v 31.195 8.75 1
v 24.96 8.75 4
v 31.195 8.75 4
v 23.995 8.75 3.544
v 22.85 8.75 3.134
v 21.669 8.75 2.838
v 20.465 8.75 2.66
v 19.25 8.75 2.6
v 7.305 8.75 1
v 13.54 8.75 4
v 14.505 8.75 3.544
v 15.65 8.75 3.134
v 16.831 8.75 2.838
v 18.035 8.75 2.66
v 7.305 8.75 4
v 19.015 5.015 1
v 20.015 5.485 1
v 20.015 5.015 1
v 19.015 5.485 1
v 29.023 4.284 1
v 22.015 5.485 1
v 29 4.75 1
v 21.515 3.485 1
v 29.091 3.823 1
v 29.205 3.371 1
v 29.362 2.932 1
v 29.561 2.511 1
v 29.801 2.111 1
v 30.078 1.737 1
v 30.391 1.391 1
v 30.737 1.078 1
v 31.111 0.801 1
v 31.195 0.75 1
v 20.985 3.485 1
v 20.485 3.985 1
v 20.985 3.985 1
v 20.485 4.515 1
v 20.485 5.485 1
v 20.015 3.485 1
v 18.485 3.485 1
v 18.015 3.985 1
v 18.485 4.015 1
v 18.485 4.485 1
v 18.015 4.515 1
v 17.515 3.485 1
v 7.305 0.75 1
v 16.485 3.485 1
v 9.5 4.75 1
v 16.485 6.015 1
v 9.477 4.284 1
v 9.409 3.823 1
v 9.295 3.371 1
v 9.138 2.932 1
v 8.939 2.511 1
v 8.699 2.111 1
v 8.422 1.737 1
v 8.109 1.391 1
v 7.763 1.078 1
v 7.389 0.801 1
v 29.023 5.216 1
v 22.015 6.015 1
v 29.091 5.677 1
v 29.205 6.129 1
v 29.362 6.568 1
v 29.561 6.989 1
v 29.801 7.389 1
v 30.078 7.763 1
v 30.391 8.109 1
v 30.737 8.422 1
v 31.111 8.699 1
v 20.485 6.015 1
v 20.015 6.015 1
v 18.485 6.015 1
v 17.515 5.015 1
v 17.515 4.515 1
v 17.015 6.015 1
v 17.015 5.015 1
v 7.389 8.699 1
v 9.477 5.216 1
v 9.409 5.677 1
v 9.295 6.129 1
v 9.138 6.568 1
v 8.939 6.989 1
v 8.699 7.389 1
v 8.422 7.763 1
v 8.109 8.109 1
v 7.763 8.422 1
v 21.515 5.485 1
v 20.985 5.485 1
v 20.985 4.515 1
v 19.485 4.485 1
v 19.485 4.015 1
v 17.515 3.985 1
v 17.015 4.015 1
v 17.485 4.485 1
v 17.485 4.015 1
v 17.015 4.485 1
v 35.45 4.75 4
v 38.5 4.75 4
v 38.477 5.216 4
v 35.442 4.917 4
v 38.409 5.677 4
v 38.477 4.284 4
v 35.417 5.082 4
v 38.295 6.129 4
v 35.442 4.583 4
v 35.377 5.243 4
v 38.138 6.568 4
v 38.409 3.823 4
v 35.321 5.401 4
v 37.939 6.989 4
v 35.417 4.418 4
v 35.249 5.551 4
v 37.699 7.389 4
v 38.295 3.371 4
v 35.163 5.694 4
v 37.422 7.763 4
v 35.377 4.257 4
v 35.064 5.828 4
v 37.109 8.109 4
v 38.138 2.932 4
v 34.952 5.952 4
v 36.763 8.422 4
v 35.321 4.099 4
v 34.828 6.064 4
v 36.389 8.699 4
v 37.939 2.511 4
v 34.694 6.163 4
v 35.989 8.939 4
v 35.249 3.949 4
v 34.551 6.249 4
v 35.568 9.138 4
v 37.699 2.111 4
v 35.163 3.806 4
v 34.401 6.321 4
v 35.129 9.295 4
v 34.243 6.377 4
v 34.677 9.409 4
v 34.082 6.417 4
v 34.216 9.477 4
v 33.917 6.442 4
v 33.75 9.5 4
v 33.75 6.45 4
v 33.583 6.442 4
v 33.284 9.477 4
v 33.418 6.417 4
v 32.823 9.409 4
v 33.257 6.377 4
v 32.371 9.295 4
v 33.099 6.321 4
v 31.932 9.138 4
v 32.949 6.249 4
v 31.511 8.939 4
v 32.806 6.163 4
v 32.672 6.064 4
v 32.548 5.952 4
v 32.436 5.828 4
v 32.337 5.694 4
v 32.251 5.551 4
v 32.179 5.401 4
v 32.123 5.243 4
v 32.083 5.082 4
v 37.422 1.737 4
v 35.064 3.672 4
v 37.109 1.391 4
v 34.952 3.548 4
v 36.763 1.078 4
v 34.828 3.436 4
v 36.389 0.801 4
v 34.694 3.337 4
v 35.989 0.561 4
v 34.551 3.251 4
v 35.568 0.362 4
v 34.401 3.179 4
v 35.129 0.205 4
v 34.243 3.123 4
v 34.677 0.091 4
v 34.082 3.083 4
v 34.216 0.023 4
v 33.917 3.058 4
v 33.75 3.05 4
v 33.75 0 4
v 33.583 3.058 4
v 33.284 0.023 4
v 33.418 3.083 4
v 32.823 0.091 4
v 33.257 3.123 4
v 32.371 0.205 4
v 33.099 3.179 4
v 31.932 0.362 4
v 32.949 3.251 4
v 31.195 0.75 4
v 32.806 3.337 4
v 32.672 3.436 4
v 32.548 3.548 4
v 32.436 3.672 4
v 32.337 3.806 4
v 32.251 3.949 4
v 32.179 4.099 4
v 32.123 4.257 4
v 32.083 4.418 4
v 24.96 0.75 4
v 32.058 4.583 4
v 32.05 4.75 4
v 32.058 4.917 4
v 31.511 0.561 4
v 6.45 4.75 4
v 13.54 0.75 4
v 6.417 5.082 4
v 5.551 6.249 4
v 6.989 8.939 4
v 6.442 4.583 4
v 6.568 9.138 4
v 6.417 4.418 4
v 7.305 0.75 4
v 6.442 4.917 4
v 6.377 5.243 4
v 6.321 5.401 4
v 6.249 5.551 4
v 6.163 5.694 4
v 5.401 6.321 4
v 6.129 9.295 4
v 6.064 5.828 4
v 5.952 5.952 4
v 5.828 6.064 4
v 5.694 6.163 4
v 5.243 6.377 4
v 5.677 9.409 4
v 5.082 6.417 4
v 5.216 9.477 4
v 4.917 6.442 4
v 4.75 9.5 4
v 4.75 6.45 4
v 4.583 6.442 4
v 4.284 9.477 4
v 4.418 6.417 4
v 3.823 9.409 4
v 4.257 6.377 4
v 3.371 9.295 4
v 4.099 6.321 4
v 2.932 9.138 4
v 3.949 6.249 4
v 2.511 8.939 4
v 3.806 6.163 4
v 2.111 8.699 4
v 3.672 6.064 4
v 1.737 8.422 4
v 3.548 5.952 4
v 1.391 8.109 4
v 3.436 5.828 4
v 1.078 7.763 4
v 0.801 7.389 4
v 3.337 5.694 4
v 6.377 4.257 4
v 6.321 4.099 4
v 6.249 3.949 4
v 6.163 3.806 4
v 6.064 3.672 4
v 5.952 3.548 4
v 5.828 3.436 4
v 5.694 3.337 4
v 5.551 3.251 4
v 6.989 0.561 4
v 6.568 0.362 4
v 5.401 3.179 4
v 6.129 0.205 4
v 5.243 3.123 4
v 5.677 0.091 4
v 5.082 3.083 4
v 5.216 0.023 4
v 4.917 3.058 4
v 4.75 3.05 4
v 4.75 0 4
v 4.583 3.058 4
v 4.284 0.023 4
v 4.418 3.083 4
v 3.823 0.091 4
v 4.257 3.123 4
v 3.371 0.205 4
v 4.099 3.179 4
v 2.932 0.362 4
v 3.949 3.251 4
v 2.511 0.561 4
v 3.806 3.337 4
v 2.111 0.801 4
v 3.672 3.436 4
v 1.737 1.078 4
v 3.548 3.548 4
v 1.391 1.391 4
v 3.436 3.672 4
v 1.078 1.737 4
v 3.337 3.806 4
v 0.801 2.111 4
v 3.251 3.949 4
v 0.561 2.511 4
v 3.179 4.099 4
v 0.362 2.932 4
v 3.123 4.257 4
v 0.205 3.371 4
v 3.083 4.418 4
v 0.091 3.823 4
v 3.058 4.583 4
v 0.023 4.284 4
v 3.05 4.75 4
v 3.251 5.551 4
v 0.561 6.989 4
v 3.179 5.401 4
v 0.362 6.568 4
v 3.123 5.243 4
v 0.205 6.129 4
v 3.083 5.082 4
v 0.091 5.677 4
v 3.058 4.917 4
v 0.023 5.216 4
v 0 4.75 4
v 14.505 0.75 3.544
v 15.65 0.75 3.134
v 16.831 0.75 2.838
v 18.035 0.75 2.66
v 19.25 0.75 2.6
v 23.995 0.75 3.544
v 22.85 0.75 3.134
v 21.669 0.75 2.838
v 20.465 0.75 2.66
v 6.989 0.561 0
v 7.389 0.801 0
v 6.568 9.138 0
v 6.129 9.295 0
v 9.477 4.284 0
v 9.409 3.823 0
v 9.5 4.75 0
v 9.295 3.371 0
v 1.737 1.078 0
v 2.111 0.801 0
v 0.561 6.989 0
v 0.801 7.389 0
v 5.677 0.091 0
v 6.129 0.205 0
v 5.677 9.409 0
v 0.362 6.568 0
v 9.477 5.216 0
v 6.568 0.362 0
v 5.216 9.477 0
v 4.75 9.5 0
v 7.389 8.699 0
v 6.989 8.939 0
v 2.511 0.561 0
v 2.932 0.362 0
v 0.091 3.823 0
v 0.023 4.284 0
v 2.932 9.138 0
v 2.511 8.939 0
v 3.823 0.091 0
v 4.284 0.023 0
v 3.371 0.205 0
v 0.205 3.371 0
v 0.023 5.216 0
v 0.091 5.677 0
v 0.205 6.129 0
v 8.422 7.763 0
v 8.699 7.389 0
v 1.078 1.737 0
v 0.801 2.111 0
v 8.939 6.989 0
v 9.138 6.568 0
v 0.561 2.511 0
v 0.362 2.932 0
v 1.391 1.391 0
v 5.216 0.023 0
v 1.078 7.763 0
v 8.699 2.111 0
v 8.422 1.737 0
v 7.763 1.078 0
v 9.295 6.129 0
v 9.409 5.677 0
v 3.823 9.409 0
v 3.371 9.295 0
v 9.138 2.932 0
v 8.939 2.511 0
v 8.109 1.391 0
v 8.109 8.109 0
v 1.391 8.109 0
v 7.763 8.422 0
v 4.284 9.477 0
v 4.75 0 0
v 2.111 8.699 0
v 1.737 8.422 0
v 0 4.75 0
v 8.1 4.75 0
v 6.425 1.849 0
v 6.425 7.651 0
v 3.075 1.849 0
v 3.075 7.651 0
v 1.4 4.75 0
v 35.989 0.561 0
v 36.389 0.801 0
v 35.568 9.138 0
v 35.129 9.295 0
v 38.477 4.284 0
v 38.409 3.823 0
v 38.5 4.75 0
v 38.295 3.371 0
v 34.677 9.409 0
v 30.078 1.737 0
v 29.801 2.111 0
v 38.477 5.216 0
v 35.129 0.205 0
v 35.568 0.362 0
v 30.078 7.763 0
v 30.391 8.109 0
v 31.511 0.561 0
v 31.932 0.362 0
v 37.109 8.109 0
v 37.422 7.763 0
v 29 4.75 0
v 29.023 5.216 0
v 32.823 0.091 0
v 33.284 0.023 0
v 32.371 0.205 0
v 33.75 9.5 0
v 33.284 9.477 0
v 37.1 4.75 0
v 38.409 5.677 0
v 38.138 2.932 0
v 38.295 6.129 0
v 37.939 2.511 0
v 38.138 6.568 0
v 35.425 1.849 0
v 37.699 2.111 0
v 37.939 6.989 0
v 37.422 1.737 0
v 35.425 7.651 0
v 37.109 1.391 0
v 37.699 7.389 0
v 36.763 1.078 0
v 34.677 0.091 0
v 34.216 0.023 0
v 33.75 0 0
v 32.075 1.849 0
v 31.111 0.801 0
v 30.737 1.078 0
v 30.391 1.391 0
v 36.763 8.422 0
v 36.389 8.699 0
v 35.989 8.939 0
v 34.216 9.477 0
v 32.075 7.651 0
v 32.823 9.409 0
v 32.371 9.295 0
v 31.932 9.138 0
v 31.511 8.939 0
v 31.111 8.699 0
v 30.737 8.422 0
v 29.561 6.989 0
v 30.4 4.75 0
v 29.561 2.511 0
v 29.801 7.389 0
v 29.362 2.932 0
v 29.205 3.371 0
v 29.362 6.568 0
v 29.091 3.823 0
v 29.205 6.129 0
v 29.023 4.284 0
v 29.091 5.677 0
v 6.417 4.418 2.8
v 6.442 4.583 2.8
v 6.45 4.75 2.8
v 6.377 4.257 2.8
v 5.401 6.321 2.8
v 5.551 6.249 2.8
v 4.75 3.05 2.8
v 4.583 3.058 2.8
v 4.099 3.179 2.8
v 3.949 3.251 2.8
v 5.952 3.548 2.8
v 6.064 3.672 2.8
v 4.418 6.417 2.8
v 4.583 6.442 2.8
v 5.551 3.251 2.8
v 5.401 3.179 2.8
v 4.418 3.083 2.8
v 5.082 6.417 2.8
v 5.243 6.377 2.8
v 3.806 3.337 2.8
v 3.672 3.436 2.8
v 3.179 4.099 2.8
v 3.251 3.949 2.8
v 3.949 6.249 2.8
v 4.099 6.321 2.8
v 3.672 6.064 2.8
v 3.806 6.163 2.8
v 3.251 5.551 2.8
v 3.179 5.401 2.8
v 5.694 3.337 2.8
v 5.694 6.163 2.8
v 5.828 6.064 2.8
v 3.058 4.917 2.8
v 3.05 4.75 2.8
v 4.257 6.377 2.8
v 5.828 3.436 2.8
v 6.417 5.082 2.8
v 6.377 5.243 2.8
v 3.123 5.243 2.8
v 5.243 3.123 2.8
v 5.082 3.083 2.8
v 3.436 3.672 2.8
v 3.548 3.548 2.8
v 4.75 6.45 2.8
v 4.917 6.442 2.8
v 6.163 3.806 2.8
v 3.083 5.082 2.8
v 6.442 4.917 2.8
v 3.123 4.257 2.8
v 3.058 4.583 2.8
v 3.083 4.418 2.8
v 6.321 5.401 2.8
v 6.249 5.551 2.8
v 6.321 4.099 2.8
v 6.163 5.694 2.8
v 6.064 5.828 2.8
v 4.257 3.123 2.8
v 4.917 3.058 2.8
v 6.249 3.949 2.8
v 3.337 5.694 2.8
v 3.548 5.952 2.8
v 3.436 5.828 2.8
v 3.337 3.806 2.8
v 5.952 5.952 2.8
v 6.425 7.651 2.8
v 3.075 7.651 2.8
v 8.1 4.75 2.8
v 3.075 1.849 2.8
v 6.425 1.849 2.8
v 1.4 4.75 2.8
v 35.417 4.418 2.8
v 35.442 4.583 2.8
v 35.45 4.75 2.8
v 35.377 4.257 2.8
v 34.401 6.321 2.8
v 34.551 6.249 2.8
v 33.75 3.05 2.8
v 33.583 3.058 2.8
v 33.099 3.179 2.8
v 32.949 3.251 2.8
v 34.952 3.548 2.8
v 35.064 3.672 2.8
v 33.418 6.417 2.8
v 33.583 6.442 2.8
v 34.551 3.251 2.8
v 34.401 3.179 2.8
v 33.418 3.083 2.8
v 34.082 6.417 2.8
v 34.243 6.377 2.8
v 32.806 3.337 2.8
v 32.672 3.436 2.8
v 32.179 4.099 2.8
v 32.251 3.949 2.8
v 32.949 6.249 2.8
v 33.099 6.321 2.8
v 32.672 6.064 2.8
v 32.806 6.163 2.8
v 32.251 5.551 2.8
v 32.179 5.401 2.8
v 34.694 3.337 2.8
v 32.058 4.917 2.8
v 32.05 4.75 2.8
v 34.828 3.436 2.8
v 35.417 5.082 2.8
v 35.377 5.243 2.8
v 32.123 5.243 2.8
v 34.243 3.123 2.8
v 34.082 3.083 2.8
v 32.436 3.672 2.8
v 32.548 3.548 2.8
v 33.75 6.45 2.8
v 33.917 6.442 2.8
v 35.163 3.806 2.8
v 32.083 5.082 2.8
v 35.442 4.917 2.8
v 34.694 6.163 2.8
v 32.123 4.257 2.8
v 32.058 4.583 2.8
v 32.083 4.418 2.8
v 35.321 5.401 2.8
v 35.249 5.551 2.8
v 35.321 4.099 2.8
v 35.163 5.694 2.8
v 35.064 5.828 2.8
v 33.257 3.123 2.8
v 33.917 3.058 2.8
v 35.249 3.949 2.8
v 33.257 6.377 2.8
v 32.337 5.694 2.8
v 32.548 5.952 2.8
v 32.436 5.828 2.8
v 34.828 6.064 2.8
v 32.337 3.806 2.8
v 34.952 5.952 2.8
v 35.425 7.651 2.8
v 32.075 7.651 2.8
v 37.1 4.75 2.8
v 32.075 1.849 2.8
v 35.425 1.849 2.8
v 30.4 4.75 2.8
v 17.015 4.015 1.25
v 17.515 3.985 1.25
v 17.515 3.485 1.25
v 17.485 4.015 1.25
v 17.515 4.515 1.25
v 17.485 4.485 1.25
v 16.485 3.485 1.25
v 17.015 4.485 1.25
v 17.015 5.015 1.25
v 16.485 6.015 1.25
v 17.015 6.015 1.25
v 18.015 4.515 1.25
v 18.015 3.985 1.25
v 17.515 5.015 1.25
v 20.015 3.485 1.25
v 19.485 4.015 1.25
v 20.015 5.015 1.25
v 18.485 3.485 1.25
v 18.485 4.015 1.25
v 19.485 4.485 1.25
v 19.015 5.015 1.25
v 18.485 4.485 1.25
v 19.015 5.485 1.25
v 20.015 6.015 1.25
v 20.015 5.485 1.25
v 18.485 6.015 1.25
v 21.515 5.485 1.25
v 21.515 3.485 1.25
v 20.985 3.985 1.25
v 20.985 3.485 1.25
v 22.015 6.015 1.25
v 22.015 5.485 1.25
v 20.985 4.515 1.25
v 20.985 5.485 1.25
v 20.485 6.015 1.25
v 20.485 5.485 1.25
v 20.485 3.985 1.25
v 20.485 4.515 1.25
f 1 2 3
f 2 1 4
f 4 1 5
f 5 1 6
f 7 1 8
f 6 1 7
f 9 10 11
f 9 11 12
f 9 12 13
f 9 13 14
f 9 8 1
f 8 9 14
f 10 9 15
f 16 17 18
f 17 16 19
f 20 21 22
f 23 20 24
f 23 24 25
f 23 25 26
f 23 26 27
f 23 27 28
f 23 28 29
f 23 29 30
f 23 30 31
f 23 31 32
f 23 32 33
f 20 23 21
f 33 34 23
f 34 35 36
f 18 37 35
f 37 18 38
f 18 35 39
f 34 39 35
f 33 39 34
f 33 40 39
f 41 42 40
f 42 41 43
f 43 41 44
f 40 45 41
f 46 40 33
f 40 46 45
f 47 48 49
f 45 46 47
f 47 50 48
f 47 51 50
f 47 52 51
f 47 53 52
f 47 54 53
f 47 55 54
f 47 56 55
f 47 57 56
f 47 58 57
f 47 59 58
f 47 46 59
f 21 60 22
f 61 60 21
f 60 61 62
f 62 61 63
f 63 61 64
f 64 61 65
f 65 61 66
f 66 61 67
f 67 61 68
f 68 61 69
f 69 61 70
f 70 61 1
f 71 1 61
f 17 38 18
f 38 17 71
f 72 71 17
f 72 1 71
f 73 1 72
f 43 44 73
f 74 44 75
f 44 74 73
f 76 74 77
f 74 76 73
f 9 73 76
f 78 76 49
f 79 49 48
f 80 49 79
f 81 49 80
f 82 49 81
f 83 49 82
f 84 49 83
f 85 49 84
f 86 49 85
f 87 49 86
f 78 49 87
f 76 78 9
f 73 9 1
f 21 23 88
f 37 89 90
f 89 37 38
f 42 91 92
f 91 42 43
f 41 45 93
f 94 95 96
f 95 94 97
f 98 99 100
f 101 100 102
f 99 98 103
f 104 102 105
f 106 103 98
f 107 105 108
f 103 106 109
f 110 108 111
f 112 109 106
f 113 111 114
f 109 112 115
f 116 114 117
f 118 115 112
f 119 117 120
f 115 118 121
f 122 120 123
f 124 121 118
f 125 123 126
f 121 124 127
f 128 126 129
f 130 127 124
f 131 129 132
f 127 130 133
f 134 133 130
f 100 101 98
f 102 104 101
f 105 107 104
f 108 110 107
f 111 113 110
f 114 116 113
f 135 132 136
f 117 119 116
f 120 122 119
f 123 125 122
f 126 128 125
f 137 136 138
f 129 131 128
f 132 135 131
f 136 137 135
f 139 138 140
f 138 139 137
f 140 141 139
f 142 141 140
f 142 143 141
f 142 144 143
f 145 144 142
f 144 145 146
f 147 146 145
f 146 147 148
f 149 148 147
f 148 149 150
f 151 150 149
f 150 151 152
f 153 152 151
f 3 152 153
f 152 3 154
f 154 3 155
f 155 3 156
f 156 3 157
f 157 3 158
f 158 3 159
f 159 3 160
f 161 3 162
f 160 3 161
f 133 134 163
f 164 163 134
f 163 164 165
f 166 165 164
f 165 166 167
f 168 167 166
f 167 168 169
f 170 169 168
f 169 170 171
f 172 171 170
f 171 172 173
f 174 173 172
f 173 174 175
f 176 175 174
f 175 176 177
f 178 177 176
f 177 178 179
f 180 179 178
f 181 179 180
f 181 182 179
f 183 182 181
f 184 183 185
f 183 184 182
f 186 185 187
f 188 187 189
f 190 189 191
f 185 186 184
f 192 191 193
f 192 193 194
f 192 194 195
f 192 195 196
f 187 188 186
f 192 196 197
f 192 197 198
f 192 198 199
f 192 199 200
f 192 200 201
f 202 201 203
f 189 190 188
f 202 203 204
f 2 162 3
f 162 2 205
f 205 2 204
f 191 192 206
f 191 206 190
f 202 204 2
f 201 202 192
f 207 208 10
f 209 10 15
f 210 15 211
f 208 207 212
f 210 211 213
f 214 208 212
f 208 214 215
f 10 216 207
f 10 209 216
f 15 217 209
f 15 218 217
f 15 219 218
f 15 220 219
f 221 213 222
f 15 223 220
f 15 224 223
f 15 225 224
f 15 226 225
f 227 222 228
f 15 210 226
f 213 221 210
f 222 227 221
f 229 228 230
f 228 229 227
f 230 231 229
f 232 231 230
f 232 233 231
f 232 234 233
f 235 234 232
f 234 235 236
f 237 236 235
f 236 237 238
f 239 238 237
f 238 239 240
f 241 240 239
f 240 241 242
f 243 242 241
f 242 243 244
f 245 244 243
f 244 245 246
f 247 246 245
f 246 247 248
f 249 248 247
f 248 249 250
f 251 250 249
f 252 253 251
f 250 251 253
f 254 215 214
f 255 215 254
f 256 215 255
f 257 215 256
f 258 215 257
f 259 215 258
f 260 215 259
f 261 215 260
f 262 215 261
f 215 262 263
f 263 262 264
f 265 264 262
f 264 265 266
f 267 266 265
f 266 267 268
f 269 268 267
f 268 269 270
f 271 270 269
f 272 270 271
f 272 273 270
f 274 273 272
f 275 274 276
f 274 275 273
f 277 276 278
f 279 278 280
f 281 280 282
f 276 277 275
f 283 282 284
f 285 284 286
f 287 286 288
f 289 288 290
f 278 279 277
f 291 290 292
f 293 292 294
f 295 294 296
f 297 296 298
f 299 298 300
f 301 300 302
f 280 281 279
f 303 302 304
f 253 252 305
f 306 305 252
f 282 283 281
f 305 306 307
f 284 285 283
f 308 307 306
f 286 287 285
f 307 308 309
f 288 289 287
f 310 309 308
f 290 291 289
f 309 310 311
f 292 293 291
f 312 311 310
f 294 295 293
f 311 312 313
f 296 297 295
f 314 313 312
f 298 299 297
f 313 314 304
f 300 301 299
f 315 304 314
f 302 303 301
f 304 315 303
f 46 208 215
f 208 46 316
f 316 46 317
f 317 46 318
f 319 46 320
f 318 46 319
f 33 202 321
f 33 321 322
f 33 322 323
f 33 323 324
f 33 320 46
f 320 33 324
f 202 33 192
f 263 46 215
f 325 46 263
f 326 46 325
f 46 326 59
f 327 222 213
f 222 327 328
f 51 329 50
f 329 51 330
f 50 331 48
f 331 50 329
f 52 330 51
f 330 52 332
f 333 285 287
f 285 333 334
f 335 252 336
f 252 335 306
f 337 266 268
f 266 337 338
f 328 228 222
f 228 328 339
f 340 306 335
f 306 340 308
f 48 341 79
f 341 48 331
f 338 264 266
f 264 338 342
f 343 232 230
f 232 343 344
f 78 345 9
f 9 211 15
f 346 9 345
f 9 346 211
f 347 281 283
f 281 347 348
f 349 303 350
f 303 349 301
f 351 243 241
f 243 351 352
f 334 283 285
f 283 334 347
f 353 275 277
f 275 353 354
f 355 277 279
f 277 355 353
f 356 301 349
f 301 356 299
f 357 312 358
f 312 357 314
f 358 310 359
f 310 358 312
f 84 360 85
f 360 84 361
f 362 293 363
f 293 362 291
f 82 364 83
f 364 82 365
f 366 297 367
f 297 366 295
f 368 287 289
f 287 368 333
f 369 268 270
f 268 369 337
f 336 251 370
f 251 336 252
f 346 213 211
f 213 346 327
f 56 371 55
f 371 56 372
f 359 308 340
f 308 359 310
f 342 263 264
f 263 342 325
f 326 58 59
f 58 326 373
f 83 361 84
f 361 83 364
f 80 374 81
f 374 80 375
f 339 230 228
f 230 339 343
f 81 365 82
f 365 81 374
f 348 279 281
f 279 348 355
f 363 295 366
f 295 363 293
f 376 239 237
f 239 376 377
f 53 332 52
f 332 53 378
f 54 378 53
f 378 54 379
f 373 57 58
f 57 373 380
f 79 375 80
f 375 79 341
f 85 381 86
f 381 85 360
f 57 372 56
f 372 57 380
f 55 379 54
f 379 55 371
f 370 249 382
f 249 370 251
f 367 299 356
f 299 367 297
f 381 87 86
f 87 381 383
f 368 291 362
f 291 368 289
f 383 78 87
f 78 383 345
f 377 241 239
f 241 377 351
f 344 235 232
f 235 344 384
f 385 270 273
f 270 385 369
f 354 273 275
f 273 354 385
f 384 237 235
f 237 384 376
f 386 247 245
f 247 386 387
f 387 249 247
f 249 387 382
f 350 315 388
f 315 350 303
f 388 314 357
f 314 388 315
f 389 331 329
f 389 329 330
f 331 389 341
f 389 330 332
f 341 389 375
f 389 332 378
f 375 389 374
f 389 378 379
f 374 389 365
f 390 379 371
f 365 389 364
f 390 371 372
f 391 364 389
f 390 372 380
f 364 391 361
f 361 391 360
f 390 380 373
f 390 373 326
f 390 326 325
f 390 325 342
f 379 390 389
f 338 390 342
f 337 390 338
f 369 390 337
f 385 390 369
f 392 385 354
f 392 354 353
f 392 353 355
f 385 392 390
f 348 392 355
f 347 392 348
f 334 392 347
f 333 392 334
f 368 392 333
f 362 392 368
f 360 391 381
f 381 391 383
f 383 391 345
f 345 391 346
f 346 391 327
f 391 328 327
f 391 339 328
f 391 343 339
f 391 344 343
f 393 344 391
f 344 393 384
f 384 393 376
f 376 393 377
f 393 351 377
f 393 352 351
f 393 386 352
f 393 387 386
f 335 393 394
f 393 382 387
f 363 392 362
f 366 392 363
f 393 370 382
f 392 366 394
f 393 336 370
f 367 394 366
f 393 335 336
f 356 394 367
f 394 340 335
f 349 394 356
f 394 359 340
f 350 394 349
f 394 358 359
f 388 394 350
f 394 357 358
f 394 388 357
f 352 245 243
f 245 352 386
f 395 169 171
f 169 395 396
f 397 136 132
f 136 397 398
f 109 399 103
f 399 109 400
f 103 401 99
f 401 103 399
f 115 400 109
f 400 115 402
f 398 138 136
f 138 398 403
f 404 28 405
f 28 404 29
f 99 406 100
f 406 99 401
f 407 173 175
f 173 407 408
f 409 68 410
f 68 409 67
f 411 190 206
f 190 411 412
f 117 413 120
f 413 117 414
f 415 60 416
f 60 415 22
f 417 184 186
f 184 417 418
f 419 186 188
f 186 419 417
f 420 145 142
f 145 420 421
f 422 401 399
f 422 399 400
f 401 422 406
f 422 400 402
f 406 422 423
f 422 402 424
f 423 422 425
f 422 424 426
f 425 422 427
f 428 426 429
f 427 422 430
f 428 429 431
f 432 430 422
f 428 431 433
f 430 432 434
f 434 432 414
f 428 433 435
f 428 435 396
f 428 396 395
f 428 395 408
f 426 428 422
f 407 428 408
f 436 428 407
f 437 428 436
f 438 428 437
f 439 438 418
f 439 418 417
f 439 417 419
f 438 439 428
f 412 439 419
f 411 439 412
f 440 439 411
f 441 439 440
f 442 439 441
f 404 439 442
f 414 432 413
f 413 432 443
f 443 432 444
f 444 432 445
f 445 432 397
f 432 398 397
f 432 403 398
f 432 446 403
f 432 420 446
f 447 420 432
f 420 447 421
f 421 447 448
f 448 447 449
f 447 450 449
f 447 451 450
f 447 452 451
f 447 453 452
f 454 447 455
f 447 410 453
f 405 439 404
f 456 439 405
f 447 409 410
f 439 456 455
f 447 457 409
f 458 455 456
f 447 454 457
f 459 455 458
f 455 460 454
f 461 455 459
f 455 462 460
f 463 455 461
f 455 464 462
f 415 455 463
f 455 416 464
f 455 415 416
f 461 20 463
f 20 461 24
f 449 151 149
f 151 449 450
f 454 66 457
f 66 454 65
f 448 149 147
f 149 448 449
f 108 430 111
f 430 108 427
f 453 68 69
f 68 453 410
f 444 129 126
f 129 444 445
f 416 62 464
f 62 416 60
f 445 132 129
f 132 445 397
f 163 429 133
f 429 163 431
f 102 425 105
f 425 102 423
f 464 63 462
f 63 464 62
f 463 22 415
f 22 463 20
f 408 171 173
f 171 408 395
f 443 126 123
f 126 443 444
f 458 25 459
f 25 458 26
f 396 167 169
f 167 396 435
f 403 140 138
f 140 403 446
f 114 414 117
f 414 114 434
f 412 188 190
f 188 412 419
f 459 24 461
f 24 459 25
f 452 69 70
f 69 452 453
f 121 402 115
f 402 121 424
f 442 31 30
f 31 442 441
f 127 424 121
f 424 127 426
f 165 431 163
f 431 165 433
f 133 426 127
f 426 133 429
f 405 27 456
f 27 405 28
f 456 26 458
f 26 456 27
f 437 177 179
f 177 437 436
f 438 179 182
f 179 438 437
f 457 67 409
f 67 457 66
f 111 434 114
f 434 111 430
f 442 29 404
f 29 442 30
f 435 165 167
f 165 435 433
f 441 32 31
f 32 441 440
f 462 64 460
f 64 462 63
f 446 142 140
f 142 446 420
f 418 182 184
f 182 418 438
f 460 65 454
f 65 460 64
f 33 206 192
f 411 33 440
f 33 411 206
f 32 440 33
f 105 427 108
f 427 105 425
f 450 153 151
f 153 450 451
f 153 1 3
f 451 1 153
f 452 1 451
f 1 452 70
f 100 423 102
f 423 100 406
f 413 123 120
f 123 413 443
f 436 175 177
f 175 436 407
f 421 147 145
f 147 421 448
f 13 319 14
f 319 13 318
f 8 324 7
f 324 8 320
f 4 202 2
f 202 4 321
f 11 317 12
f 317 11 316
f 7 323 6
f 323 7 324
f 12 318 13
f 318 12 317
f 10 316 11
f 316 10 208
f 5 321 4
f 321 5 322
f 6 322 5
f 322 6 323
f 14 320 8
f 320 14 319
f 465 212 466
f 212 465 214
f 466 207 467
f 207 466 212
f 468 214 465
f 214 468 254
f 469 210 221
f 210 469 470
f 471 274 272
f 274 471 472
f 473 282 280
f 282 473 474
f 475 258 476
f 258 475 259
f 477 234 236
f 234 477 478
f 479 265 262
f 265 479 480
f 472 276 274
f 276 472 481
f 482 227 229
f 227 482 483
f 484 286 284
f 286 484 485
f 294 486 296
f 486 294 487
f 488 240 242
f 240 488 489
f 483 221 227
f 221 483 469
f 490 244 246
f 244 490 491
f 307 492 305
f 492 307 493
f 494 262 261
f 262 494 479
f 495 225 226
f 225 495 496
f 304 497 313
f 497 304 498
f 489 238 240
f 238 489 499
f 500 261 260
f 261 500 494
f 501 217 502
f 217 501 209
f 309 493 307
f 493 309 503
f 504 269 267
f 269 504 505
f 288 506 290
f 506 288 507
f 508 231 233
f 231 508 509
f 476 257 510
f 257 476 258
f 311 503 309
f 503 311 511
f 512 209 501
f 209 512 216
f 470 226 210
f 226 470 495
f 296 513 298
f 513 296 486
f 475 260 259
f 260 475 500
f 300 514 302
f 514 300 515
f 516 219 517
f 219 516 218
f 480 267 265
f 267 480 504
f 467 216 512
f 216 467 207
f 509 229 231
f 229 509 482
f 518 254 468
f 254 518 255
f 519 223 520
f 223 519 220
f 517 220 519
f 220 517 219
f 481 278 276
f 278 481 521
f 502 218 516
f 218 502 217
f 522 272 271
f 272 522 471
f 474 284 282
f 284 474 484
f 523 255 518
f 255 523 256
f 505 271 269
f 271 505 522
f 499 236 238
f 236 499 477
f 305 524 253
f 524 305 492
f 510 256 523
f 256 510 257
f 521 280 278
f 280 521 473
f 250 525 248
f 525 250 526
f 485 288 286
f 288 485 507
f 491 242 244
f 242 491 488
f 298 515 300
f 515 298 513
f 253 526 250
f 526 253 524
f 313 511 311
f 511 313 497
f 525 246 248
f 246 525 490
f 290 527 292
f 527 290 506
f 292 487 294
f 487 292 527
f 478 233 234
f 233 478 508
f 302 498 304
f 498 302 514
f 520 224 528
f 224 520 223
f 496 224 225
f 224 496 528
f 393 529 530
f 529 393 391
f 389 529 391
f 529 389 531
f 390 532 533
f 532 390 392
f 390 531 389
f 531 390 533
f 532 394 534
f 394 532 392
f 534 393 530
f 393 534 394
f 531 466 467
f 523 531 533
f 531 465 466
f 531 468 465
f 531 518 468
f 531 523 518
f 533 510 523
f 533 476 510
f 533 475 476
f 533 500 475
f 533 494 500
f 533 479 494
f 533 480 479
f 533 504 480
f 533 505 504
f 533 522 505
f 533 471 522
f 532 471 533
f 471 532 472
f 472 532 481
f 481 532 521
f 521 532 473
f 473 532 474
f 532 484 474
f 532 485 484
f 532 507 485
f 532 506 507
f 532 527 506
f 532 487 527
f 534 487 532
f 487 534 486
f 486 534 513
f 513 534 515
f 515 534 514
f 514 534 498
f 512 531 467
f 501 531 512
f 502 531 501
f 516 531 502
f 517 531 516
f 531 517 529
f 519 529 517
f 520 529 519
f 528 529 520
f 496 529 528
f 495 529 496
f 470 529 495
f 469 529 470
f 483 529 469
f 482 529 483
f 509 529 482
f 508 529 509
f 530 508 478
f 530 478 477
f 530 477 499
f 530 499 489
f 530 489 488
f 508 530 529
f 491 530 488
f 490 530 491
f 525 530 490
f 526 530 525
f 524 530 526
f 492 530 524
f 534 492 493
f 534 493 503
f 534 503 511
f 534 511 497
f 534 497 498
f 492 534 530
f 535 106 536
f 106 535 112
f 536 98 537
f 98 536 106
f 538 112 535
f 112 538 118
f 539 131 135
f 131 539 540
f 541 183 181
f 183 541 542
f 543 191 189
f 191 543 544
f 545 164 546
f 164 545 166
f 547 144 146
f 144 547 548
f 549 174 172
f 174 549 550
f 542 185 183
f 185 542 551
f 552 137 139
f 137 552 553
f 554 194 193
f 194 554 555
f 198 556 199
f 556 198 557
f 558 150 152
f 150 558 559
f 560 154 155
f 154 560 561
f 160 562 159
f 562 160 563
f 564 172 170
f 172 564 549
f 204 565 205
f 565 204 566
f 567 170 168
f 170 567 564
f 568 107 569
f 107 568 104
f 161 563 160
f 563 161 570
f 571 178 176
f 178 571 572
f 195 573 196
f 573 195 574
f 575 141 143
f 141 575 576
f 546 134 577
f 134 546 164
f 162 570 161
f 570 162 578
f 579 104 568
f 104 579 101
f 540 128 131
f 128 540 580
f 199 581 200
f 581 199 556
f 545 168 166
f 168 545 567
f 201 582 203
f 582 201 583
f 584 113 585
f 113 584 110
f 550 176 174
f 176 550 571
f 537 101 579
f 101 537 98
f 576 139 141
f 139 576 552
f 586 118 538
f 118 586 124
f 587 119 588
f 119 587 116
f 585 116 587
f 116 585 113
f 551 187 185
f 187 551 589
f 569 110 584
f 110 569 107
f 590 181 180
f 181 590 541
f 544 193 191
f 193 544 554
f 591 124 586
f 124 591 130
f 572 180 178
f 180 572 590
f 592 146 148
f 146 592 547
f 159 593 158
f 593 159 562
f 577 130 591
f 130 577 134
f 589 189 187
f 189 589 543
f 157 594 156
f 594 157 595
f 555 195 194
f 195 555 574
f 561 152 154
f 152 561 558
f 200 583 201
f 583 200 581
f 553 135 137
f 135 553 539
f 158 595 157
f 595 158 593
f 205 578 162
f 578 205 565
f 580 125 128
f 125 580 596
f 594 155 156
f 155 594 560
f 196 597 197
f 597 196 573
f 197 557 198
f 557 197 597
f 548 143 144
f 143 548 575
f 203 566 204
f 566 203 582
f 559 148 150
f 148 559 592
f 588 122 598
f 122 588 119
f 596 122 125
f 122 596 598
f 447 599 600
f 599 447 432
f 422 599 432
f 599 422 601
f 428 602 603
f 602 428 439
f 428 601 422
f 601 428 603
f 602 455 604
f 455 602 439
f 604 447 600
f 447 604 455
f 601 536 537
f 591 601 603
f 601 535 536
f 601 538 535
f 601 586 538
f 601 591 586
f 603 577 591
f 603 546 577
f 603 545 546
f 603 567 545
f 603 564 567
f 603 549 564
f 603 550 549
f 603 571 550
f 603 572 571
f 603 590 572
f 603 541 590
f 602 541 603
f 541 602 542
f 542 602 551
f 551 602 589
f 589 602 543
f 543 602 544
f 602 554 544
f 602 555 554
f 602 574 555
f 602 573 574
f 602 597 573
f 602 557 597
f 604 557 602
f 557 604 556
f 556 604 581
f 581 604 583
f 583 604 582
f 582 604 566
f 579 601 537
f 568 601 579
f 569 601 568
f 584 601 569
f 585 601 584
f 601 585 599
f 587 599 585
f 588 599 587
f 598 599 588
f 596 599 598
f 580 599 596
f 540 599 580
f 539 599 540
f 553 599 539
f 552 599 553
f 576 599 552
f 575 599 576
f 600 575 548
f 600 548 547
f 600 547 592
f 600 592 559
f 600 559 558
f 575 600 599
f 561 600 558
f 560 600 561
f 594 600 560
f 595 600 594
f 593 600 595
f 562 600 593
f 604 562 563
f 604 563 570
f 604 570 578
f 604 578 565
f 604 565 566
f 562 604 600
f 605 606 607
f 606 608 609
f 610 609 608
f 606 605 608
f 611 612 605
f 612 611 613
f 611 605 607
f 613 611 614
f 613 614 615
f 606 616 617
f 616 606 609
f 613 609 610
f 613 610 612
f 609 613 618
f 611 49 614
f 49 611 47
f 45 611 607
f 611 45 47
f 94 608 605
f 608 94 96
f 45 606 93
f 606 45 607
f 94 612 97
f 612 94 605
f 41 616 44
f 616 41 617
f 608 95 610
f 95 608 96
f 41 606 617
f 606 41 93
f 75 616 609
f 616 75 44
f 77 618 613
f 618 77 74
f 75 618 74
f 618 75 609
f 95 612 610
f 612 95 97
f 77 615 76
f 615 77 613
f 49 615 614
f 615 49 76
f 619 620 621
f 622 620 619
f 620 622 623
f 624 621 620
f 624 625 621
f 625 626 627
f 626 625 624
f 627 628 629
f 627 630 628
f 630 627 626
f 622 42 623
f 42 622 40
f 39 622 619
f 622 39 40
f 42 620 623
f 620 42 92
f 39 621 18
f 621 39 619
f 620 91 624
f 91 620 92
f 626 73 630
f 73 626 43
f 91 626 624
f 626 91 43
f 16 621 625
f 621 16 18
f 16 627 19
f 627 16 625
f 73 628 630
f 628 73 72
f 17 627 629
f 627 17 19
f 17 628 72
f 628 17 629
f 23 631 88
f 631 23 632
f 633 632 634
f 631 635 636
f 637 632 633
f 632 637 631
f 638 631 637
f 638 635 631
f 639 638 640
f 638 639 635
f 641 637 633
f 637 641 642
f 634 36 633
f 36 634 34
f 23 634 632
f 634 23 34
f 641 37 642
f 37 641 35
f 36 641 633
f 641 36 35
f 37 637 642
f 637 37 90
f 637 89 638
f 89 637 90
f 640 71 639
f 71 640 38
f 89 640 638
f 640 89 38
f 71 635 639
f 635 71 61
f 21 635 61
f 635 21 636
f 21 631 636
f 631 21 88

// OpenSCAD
// RF300上夾板・反向長螺絲
$fn=64;
translate([-41.75,-69.55,69.2]){rotate([180,0,0]){difference(){translate([0,-14.3,0]){difference(){difference(){difference(){difference(){difference(){union(){union(){translate([61,-60,0]){translate([0,0,65.2]){linear_extrude(height=3)polygon([[17.5,1],[17.44236,1.58527],[17.27164,2.14805],[16.99441,2.66671],[16.62132,3.12132],[16.16671,3.49441],[15.64805,3.77164],[15.08527,3.94236],[14.5,4],[-14.5,4],[-15.08527,3.94236],[-15.64805,3.77164],[-16.16671,3.49441],[-16.62132,3.12132],[-16.99441,2.66671],[-17.27164,2.14805],[-17.44236,1.58527],[-17.5,1],[-17.5,-1],[-17.44236,-1.58527],[-17.27164,-2.14805],[-16.99441,-2.66671],[-16.62132,-3.12132],[-16.16671,-3.49441],[-15.64805,-3.77164],[-15.08527,-3.94236],[-14.5,-4],[14.5,-4],[15.08527,-3.94236],[15.64805,-3.77164],[16.16671,-3.49441],[16.62132,-3.12132],[16.99441,-2.66671],[17.27164,-2.14805],[17.44236,-1.58527],[17.5,-1]]);}}translate([46.5,-60,65.2]){cylinder(h=4,d1=9.5,d2=9.5,$fn=64);}}translate([75.5,-60,65.2]){cylinder(h=4,d1=9.5,d2=9.5,$fn=64);}}translate([61,-66,54.2]){rotate([-90,0,0]){translate([0,0,0]){cylinder(h=12,d1=24.8,d2=24.8,$fn=64);}}}}translate([46.5,-60,64]){cylinder(h=10,d1=3.4,d2=3.4,$fn=64);}}translate([46.5,-60,66.4]){cylinder(h=4.1,d1=6.7,d2=6.7,$fn=6);}}translate([75.5,-60,64]){cylinder(h=10,d1=3.4,d2=3.4,$fn=64);}}translate([75.5,-60,66.4]){cylinder(h=4.1,d1=6.7,d2=6.7,$fn=6);}}}difference(){translate([0,-14.3,0]){difference(){difference(){difference(){difference(){difference(){translate([61,-60,0]){translate([0,0,65.2]){linear_extrude(height=3)polygon([[17.5,1],[17.44236,1.58527],[17.27164,2.14805],[16.99441,2.66671],[16.62132,3.12132],[16.16671,3.49441],[15.64805,3.77164],[15.08527,3.94236],[14.5,4],[-14.5,4],[-15.08527,3.94236],[-15.64805,3.77164],[-16.16671,3.49441],[-16.62132,3.12132],[-16.99441,2.66671],[-17.27164,2.14805],[-17.44236,1.58527],[-17.5,1],[-17.5,-1],[-17.44236,-1.58527],[-17.27164,-2.14805],[-16.99441,-2.66671],[-16.62132,-3.12132],[-16.16671,-3.49441],[-15.64805,-3.77164],[-15.08527,-3.94236],[-14.5,-4],[14.5,-4],[15.08527,-3.94236],[15.64805,-3.77164],[16.16671,-3.49441],[16.62132,-3.12132],[16.99441,-2.66671],[17.27164,-2.14805],[17.44236,-1.58527],[17.5,-1]]);}}translate([61,-66,54.2]){rotate([-90,0,0]){translate([0,0,0]){cylinder(h=12,d1=24.8,d2=24.8,$fn=64);}}}}translate([46.5,-60,64]){cylinder(h=7,d1=3.4,d2=3.4,$fn=64);}}translate([46.5,-60,68.3]){rotate([180,0,0]){translate([0,0,0]){cylinder(h=1.7,d1=6.4,d2=3.4,$fn=64);}}}}translate([75.5,-60,64]){cylinder(h=7,d1=3.4,d2=3.4,$fn=64);}}translate([75.5,-60,68.3]){rotate([180,0,0]){translate([0,0,0]){cylinder(h=1.7,d1=6.4,d2=3.4,$fn=64);}}}}}difference(){translate([0,-14.3,0]){difference(){difference(){difference(){difference(){difference(){translate([61,-60,0]){translate([0,0,65.2]){linear_extrude(height=3)polygon([[17.5,1],[17.44236,1.58527],[17.27164,2.14805],[16.99441,2.66671],[16.62132,3.12132],[16.16671,3.49441],[15.64805,3.77164],[15.08527,3.94236],[14.5,4],[-14.5,4],[-15.08527,3.94236],[-15.64805,3.77164],[-16.16671,3.49441],[-16.62132,3.12132],[-16.99441,2.66671],[-17.27164,2.14805],[-17.44236,1.58527],[-17.5,1],[-17.5,-1],[-17.44236,-1.58527],[-17.27164,-2.14805],[-16.99441,-2.66671],[-16.62132,-3.12132],[-16.16671,-3.49441],[-15.64805,-3.77164],[-15.08527,-3.94236],[-14.5,-4],[14.5,-4],[15.08527,-3.94236],[15.64805,-3.77164],[16.16671,-3.49441],[16.62132,-3.12132],[16.99441,-2.66671],[17.27164,-2.14805],[17.44236,-1.58527],[17.5,-1]]);}}translate([61,-66,54.2]){rotate([-90,0,0]){translate([0,0,0]){cylinder(h=12,d1=24.8,d2=24.8,$fn=64);}}}}translate([46.5,-60,64]){cylinder(h=7,d1=3.4,d2=3.4,$fn=64);}}translate([46.5,-60,68.3]){rotate([180,0,0]){translate([0,0,0]){cylinder(h=1.7,d1=6.4,d2=3.4,$fn=64);}}}}translate([75.5,-60,64]){cylinder(h=7,d1=3.4,d2=3.4,$fn=64);}}translate([75.5,-60,68.3]){rotate([180,0,0]){translate([0,0,0]){cylinder(h=1.7,d1=6.4,d2=3.4,$fn=64);}}}}}multmatrix([[1,0,0,61],[0,1,0,-74.3],[0,0,1,68.2],[0,0,0,1]]){union(){union(){union(){union(){union(){union(){union(){union(){union(){union(){union(){union(){union(){union(){union(){union(){union(){union(){union(){union(){union(){union(){union(){union(){union(){union(){translate([-2.765,0.735,-0.25]){cube([0.53,0.53,0.37]);}translate([-2.265,0.735,-0.25]){cube([0.53,0.53,0.37]);}}translate([-2.765,0.235,-0.25]){cube([0.53,0.53,0.37]);}}translate([-1.765,0.235,-0.25]){cube([0.53,0.53,0.37]);}}translate([-2.765,-0.265,-0.25]){cube([0.53,0.53,0.37]);}}translate([-2.265,-0.265,-0.25]){cube([0.53,0.53,0.37]);}}translate([-2.765,-0.765,-0.25]){cube([0.53,0.53,0.37]);}}translate([-2.765,-1.265,-0.25]){cube([0.53,0.53,0.37]);}}translate([-0.765,0.735,-0.25]){cube([0.53,0.53,0.37]);}}translate([-0.265,0.735,-0.25]){cube([0.53,0.53,0.37]);}}translate([0.235,0.735,-0.25]){cube([0.53,0.53,0.37]);}}translate([0.235,0.235,-0.25]){cube([0.53,0.53,0.37]);}}translate([-0.765,-0.265,-0.25]){cube([0.53,0.53,0.37]);}}translate([-0.265,-0.265,-0.25]){cube([0.53,0.53,0.37]);}}translate([0.235,-0.265,-0.25]){cube([0.53,0.53,0.37]);}}translate([-0.765,-0.765,-0.25]){cube([0.53,0.53,0.37]);}}translate([-0.765,-1.265,-0.25]){cube([0.53,0.53,0.37]);}}translate([-0.265,-1.265,-0.25]){cube([0.53,0.53,0.37]);}}translate([0.235,-1.265,-0.25]){cube([0.53,0.53,0.37]);}}translate([1.735,0.735,-0.25]){cube([0.53,0.53,0.37]);}}translate([1.235,0.235,-0.25]){cube([0.53,0.53,0.37]);}}translate([1.735,0.235,-0.25]){cube([0.53,0.53,0.37]);}}translate([1.735,-0.265,-0.25]){cube([0.53,0.53,0.37]);}}translate([1.735,-0.765,-0.25]){cube([0.53,0.53,0.37]);}}translate([1.235,-1.265,-0.25]){cube([0.53,0.53,0.37]);}}translate([1.735,-1.265,-0.25]){cube([0.53,0.53,0.37]);}}translate([2.235,-1.265,-0.25]){cube([0.53,0.53,0.37]);}}}}}}}}
